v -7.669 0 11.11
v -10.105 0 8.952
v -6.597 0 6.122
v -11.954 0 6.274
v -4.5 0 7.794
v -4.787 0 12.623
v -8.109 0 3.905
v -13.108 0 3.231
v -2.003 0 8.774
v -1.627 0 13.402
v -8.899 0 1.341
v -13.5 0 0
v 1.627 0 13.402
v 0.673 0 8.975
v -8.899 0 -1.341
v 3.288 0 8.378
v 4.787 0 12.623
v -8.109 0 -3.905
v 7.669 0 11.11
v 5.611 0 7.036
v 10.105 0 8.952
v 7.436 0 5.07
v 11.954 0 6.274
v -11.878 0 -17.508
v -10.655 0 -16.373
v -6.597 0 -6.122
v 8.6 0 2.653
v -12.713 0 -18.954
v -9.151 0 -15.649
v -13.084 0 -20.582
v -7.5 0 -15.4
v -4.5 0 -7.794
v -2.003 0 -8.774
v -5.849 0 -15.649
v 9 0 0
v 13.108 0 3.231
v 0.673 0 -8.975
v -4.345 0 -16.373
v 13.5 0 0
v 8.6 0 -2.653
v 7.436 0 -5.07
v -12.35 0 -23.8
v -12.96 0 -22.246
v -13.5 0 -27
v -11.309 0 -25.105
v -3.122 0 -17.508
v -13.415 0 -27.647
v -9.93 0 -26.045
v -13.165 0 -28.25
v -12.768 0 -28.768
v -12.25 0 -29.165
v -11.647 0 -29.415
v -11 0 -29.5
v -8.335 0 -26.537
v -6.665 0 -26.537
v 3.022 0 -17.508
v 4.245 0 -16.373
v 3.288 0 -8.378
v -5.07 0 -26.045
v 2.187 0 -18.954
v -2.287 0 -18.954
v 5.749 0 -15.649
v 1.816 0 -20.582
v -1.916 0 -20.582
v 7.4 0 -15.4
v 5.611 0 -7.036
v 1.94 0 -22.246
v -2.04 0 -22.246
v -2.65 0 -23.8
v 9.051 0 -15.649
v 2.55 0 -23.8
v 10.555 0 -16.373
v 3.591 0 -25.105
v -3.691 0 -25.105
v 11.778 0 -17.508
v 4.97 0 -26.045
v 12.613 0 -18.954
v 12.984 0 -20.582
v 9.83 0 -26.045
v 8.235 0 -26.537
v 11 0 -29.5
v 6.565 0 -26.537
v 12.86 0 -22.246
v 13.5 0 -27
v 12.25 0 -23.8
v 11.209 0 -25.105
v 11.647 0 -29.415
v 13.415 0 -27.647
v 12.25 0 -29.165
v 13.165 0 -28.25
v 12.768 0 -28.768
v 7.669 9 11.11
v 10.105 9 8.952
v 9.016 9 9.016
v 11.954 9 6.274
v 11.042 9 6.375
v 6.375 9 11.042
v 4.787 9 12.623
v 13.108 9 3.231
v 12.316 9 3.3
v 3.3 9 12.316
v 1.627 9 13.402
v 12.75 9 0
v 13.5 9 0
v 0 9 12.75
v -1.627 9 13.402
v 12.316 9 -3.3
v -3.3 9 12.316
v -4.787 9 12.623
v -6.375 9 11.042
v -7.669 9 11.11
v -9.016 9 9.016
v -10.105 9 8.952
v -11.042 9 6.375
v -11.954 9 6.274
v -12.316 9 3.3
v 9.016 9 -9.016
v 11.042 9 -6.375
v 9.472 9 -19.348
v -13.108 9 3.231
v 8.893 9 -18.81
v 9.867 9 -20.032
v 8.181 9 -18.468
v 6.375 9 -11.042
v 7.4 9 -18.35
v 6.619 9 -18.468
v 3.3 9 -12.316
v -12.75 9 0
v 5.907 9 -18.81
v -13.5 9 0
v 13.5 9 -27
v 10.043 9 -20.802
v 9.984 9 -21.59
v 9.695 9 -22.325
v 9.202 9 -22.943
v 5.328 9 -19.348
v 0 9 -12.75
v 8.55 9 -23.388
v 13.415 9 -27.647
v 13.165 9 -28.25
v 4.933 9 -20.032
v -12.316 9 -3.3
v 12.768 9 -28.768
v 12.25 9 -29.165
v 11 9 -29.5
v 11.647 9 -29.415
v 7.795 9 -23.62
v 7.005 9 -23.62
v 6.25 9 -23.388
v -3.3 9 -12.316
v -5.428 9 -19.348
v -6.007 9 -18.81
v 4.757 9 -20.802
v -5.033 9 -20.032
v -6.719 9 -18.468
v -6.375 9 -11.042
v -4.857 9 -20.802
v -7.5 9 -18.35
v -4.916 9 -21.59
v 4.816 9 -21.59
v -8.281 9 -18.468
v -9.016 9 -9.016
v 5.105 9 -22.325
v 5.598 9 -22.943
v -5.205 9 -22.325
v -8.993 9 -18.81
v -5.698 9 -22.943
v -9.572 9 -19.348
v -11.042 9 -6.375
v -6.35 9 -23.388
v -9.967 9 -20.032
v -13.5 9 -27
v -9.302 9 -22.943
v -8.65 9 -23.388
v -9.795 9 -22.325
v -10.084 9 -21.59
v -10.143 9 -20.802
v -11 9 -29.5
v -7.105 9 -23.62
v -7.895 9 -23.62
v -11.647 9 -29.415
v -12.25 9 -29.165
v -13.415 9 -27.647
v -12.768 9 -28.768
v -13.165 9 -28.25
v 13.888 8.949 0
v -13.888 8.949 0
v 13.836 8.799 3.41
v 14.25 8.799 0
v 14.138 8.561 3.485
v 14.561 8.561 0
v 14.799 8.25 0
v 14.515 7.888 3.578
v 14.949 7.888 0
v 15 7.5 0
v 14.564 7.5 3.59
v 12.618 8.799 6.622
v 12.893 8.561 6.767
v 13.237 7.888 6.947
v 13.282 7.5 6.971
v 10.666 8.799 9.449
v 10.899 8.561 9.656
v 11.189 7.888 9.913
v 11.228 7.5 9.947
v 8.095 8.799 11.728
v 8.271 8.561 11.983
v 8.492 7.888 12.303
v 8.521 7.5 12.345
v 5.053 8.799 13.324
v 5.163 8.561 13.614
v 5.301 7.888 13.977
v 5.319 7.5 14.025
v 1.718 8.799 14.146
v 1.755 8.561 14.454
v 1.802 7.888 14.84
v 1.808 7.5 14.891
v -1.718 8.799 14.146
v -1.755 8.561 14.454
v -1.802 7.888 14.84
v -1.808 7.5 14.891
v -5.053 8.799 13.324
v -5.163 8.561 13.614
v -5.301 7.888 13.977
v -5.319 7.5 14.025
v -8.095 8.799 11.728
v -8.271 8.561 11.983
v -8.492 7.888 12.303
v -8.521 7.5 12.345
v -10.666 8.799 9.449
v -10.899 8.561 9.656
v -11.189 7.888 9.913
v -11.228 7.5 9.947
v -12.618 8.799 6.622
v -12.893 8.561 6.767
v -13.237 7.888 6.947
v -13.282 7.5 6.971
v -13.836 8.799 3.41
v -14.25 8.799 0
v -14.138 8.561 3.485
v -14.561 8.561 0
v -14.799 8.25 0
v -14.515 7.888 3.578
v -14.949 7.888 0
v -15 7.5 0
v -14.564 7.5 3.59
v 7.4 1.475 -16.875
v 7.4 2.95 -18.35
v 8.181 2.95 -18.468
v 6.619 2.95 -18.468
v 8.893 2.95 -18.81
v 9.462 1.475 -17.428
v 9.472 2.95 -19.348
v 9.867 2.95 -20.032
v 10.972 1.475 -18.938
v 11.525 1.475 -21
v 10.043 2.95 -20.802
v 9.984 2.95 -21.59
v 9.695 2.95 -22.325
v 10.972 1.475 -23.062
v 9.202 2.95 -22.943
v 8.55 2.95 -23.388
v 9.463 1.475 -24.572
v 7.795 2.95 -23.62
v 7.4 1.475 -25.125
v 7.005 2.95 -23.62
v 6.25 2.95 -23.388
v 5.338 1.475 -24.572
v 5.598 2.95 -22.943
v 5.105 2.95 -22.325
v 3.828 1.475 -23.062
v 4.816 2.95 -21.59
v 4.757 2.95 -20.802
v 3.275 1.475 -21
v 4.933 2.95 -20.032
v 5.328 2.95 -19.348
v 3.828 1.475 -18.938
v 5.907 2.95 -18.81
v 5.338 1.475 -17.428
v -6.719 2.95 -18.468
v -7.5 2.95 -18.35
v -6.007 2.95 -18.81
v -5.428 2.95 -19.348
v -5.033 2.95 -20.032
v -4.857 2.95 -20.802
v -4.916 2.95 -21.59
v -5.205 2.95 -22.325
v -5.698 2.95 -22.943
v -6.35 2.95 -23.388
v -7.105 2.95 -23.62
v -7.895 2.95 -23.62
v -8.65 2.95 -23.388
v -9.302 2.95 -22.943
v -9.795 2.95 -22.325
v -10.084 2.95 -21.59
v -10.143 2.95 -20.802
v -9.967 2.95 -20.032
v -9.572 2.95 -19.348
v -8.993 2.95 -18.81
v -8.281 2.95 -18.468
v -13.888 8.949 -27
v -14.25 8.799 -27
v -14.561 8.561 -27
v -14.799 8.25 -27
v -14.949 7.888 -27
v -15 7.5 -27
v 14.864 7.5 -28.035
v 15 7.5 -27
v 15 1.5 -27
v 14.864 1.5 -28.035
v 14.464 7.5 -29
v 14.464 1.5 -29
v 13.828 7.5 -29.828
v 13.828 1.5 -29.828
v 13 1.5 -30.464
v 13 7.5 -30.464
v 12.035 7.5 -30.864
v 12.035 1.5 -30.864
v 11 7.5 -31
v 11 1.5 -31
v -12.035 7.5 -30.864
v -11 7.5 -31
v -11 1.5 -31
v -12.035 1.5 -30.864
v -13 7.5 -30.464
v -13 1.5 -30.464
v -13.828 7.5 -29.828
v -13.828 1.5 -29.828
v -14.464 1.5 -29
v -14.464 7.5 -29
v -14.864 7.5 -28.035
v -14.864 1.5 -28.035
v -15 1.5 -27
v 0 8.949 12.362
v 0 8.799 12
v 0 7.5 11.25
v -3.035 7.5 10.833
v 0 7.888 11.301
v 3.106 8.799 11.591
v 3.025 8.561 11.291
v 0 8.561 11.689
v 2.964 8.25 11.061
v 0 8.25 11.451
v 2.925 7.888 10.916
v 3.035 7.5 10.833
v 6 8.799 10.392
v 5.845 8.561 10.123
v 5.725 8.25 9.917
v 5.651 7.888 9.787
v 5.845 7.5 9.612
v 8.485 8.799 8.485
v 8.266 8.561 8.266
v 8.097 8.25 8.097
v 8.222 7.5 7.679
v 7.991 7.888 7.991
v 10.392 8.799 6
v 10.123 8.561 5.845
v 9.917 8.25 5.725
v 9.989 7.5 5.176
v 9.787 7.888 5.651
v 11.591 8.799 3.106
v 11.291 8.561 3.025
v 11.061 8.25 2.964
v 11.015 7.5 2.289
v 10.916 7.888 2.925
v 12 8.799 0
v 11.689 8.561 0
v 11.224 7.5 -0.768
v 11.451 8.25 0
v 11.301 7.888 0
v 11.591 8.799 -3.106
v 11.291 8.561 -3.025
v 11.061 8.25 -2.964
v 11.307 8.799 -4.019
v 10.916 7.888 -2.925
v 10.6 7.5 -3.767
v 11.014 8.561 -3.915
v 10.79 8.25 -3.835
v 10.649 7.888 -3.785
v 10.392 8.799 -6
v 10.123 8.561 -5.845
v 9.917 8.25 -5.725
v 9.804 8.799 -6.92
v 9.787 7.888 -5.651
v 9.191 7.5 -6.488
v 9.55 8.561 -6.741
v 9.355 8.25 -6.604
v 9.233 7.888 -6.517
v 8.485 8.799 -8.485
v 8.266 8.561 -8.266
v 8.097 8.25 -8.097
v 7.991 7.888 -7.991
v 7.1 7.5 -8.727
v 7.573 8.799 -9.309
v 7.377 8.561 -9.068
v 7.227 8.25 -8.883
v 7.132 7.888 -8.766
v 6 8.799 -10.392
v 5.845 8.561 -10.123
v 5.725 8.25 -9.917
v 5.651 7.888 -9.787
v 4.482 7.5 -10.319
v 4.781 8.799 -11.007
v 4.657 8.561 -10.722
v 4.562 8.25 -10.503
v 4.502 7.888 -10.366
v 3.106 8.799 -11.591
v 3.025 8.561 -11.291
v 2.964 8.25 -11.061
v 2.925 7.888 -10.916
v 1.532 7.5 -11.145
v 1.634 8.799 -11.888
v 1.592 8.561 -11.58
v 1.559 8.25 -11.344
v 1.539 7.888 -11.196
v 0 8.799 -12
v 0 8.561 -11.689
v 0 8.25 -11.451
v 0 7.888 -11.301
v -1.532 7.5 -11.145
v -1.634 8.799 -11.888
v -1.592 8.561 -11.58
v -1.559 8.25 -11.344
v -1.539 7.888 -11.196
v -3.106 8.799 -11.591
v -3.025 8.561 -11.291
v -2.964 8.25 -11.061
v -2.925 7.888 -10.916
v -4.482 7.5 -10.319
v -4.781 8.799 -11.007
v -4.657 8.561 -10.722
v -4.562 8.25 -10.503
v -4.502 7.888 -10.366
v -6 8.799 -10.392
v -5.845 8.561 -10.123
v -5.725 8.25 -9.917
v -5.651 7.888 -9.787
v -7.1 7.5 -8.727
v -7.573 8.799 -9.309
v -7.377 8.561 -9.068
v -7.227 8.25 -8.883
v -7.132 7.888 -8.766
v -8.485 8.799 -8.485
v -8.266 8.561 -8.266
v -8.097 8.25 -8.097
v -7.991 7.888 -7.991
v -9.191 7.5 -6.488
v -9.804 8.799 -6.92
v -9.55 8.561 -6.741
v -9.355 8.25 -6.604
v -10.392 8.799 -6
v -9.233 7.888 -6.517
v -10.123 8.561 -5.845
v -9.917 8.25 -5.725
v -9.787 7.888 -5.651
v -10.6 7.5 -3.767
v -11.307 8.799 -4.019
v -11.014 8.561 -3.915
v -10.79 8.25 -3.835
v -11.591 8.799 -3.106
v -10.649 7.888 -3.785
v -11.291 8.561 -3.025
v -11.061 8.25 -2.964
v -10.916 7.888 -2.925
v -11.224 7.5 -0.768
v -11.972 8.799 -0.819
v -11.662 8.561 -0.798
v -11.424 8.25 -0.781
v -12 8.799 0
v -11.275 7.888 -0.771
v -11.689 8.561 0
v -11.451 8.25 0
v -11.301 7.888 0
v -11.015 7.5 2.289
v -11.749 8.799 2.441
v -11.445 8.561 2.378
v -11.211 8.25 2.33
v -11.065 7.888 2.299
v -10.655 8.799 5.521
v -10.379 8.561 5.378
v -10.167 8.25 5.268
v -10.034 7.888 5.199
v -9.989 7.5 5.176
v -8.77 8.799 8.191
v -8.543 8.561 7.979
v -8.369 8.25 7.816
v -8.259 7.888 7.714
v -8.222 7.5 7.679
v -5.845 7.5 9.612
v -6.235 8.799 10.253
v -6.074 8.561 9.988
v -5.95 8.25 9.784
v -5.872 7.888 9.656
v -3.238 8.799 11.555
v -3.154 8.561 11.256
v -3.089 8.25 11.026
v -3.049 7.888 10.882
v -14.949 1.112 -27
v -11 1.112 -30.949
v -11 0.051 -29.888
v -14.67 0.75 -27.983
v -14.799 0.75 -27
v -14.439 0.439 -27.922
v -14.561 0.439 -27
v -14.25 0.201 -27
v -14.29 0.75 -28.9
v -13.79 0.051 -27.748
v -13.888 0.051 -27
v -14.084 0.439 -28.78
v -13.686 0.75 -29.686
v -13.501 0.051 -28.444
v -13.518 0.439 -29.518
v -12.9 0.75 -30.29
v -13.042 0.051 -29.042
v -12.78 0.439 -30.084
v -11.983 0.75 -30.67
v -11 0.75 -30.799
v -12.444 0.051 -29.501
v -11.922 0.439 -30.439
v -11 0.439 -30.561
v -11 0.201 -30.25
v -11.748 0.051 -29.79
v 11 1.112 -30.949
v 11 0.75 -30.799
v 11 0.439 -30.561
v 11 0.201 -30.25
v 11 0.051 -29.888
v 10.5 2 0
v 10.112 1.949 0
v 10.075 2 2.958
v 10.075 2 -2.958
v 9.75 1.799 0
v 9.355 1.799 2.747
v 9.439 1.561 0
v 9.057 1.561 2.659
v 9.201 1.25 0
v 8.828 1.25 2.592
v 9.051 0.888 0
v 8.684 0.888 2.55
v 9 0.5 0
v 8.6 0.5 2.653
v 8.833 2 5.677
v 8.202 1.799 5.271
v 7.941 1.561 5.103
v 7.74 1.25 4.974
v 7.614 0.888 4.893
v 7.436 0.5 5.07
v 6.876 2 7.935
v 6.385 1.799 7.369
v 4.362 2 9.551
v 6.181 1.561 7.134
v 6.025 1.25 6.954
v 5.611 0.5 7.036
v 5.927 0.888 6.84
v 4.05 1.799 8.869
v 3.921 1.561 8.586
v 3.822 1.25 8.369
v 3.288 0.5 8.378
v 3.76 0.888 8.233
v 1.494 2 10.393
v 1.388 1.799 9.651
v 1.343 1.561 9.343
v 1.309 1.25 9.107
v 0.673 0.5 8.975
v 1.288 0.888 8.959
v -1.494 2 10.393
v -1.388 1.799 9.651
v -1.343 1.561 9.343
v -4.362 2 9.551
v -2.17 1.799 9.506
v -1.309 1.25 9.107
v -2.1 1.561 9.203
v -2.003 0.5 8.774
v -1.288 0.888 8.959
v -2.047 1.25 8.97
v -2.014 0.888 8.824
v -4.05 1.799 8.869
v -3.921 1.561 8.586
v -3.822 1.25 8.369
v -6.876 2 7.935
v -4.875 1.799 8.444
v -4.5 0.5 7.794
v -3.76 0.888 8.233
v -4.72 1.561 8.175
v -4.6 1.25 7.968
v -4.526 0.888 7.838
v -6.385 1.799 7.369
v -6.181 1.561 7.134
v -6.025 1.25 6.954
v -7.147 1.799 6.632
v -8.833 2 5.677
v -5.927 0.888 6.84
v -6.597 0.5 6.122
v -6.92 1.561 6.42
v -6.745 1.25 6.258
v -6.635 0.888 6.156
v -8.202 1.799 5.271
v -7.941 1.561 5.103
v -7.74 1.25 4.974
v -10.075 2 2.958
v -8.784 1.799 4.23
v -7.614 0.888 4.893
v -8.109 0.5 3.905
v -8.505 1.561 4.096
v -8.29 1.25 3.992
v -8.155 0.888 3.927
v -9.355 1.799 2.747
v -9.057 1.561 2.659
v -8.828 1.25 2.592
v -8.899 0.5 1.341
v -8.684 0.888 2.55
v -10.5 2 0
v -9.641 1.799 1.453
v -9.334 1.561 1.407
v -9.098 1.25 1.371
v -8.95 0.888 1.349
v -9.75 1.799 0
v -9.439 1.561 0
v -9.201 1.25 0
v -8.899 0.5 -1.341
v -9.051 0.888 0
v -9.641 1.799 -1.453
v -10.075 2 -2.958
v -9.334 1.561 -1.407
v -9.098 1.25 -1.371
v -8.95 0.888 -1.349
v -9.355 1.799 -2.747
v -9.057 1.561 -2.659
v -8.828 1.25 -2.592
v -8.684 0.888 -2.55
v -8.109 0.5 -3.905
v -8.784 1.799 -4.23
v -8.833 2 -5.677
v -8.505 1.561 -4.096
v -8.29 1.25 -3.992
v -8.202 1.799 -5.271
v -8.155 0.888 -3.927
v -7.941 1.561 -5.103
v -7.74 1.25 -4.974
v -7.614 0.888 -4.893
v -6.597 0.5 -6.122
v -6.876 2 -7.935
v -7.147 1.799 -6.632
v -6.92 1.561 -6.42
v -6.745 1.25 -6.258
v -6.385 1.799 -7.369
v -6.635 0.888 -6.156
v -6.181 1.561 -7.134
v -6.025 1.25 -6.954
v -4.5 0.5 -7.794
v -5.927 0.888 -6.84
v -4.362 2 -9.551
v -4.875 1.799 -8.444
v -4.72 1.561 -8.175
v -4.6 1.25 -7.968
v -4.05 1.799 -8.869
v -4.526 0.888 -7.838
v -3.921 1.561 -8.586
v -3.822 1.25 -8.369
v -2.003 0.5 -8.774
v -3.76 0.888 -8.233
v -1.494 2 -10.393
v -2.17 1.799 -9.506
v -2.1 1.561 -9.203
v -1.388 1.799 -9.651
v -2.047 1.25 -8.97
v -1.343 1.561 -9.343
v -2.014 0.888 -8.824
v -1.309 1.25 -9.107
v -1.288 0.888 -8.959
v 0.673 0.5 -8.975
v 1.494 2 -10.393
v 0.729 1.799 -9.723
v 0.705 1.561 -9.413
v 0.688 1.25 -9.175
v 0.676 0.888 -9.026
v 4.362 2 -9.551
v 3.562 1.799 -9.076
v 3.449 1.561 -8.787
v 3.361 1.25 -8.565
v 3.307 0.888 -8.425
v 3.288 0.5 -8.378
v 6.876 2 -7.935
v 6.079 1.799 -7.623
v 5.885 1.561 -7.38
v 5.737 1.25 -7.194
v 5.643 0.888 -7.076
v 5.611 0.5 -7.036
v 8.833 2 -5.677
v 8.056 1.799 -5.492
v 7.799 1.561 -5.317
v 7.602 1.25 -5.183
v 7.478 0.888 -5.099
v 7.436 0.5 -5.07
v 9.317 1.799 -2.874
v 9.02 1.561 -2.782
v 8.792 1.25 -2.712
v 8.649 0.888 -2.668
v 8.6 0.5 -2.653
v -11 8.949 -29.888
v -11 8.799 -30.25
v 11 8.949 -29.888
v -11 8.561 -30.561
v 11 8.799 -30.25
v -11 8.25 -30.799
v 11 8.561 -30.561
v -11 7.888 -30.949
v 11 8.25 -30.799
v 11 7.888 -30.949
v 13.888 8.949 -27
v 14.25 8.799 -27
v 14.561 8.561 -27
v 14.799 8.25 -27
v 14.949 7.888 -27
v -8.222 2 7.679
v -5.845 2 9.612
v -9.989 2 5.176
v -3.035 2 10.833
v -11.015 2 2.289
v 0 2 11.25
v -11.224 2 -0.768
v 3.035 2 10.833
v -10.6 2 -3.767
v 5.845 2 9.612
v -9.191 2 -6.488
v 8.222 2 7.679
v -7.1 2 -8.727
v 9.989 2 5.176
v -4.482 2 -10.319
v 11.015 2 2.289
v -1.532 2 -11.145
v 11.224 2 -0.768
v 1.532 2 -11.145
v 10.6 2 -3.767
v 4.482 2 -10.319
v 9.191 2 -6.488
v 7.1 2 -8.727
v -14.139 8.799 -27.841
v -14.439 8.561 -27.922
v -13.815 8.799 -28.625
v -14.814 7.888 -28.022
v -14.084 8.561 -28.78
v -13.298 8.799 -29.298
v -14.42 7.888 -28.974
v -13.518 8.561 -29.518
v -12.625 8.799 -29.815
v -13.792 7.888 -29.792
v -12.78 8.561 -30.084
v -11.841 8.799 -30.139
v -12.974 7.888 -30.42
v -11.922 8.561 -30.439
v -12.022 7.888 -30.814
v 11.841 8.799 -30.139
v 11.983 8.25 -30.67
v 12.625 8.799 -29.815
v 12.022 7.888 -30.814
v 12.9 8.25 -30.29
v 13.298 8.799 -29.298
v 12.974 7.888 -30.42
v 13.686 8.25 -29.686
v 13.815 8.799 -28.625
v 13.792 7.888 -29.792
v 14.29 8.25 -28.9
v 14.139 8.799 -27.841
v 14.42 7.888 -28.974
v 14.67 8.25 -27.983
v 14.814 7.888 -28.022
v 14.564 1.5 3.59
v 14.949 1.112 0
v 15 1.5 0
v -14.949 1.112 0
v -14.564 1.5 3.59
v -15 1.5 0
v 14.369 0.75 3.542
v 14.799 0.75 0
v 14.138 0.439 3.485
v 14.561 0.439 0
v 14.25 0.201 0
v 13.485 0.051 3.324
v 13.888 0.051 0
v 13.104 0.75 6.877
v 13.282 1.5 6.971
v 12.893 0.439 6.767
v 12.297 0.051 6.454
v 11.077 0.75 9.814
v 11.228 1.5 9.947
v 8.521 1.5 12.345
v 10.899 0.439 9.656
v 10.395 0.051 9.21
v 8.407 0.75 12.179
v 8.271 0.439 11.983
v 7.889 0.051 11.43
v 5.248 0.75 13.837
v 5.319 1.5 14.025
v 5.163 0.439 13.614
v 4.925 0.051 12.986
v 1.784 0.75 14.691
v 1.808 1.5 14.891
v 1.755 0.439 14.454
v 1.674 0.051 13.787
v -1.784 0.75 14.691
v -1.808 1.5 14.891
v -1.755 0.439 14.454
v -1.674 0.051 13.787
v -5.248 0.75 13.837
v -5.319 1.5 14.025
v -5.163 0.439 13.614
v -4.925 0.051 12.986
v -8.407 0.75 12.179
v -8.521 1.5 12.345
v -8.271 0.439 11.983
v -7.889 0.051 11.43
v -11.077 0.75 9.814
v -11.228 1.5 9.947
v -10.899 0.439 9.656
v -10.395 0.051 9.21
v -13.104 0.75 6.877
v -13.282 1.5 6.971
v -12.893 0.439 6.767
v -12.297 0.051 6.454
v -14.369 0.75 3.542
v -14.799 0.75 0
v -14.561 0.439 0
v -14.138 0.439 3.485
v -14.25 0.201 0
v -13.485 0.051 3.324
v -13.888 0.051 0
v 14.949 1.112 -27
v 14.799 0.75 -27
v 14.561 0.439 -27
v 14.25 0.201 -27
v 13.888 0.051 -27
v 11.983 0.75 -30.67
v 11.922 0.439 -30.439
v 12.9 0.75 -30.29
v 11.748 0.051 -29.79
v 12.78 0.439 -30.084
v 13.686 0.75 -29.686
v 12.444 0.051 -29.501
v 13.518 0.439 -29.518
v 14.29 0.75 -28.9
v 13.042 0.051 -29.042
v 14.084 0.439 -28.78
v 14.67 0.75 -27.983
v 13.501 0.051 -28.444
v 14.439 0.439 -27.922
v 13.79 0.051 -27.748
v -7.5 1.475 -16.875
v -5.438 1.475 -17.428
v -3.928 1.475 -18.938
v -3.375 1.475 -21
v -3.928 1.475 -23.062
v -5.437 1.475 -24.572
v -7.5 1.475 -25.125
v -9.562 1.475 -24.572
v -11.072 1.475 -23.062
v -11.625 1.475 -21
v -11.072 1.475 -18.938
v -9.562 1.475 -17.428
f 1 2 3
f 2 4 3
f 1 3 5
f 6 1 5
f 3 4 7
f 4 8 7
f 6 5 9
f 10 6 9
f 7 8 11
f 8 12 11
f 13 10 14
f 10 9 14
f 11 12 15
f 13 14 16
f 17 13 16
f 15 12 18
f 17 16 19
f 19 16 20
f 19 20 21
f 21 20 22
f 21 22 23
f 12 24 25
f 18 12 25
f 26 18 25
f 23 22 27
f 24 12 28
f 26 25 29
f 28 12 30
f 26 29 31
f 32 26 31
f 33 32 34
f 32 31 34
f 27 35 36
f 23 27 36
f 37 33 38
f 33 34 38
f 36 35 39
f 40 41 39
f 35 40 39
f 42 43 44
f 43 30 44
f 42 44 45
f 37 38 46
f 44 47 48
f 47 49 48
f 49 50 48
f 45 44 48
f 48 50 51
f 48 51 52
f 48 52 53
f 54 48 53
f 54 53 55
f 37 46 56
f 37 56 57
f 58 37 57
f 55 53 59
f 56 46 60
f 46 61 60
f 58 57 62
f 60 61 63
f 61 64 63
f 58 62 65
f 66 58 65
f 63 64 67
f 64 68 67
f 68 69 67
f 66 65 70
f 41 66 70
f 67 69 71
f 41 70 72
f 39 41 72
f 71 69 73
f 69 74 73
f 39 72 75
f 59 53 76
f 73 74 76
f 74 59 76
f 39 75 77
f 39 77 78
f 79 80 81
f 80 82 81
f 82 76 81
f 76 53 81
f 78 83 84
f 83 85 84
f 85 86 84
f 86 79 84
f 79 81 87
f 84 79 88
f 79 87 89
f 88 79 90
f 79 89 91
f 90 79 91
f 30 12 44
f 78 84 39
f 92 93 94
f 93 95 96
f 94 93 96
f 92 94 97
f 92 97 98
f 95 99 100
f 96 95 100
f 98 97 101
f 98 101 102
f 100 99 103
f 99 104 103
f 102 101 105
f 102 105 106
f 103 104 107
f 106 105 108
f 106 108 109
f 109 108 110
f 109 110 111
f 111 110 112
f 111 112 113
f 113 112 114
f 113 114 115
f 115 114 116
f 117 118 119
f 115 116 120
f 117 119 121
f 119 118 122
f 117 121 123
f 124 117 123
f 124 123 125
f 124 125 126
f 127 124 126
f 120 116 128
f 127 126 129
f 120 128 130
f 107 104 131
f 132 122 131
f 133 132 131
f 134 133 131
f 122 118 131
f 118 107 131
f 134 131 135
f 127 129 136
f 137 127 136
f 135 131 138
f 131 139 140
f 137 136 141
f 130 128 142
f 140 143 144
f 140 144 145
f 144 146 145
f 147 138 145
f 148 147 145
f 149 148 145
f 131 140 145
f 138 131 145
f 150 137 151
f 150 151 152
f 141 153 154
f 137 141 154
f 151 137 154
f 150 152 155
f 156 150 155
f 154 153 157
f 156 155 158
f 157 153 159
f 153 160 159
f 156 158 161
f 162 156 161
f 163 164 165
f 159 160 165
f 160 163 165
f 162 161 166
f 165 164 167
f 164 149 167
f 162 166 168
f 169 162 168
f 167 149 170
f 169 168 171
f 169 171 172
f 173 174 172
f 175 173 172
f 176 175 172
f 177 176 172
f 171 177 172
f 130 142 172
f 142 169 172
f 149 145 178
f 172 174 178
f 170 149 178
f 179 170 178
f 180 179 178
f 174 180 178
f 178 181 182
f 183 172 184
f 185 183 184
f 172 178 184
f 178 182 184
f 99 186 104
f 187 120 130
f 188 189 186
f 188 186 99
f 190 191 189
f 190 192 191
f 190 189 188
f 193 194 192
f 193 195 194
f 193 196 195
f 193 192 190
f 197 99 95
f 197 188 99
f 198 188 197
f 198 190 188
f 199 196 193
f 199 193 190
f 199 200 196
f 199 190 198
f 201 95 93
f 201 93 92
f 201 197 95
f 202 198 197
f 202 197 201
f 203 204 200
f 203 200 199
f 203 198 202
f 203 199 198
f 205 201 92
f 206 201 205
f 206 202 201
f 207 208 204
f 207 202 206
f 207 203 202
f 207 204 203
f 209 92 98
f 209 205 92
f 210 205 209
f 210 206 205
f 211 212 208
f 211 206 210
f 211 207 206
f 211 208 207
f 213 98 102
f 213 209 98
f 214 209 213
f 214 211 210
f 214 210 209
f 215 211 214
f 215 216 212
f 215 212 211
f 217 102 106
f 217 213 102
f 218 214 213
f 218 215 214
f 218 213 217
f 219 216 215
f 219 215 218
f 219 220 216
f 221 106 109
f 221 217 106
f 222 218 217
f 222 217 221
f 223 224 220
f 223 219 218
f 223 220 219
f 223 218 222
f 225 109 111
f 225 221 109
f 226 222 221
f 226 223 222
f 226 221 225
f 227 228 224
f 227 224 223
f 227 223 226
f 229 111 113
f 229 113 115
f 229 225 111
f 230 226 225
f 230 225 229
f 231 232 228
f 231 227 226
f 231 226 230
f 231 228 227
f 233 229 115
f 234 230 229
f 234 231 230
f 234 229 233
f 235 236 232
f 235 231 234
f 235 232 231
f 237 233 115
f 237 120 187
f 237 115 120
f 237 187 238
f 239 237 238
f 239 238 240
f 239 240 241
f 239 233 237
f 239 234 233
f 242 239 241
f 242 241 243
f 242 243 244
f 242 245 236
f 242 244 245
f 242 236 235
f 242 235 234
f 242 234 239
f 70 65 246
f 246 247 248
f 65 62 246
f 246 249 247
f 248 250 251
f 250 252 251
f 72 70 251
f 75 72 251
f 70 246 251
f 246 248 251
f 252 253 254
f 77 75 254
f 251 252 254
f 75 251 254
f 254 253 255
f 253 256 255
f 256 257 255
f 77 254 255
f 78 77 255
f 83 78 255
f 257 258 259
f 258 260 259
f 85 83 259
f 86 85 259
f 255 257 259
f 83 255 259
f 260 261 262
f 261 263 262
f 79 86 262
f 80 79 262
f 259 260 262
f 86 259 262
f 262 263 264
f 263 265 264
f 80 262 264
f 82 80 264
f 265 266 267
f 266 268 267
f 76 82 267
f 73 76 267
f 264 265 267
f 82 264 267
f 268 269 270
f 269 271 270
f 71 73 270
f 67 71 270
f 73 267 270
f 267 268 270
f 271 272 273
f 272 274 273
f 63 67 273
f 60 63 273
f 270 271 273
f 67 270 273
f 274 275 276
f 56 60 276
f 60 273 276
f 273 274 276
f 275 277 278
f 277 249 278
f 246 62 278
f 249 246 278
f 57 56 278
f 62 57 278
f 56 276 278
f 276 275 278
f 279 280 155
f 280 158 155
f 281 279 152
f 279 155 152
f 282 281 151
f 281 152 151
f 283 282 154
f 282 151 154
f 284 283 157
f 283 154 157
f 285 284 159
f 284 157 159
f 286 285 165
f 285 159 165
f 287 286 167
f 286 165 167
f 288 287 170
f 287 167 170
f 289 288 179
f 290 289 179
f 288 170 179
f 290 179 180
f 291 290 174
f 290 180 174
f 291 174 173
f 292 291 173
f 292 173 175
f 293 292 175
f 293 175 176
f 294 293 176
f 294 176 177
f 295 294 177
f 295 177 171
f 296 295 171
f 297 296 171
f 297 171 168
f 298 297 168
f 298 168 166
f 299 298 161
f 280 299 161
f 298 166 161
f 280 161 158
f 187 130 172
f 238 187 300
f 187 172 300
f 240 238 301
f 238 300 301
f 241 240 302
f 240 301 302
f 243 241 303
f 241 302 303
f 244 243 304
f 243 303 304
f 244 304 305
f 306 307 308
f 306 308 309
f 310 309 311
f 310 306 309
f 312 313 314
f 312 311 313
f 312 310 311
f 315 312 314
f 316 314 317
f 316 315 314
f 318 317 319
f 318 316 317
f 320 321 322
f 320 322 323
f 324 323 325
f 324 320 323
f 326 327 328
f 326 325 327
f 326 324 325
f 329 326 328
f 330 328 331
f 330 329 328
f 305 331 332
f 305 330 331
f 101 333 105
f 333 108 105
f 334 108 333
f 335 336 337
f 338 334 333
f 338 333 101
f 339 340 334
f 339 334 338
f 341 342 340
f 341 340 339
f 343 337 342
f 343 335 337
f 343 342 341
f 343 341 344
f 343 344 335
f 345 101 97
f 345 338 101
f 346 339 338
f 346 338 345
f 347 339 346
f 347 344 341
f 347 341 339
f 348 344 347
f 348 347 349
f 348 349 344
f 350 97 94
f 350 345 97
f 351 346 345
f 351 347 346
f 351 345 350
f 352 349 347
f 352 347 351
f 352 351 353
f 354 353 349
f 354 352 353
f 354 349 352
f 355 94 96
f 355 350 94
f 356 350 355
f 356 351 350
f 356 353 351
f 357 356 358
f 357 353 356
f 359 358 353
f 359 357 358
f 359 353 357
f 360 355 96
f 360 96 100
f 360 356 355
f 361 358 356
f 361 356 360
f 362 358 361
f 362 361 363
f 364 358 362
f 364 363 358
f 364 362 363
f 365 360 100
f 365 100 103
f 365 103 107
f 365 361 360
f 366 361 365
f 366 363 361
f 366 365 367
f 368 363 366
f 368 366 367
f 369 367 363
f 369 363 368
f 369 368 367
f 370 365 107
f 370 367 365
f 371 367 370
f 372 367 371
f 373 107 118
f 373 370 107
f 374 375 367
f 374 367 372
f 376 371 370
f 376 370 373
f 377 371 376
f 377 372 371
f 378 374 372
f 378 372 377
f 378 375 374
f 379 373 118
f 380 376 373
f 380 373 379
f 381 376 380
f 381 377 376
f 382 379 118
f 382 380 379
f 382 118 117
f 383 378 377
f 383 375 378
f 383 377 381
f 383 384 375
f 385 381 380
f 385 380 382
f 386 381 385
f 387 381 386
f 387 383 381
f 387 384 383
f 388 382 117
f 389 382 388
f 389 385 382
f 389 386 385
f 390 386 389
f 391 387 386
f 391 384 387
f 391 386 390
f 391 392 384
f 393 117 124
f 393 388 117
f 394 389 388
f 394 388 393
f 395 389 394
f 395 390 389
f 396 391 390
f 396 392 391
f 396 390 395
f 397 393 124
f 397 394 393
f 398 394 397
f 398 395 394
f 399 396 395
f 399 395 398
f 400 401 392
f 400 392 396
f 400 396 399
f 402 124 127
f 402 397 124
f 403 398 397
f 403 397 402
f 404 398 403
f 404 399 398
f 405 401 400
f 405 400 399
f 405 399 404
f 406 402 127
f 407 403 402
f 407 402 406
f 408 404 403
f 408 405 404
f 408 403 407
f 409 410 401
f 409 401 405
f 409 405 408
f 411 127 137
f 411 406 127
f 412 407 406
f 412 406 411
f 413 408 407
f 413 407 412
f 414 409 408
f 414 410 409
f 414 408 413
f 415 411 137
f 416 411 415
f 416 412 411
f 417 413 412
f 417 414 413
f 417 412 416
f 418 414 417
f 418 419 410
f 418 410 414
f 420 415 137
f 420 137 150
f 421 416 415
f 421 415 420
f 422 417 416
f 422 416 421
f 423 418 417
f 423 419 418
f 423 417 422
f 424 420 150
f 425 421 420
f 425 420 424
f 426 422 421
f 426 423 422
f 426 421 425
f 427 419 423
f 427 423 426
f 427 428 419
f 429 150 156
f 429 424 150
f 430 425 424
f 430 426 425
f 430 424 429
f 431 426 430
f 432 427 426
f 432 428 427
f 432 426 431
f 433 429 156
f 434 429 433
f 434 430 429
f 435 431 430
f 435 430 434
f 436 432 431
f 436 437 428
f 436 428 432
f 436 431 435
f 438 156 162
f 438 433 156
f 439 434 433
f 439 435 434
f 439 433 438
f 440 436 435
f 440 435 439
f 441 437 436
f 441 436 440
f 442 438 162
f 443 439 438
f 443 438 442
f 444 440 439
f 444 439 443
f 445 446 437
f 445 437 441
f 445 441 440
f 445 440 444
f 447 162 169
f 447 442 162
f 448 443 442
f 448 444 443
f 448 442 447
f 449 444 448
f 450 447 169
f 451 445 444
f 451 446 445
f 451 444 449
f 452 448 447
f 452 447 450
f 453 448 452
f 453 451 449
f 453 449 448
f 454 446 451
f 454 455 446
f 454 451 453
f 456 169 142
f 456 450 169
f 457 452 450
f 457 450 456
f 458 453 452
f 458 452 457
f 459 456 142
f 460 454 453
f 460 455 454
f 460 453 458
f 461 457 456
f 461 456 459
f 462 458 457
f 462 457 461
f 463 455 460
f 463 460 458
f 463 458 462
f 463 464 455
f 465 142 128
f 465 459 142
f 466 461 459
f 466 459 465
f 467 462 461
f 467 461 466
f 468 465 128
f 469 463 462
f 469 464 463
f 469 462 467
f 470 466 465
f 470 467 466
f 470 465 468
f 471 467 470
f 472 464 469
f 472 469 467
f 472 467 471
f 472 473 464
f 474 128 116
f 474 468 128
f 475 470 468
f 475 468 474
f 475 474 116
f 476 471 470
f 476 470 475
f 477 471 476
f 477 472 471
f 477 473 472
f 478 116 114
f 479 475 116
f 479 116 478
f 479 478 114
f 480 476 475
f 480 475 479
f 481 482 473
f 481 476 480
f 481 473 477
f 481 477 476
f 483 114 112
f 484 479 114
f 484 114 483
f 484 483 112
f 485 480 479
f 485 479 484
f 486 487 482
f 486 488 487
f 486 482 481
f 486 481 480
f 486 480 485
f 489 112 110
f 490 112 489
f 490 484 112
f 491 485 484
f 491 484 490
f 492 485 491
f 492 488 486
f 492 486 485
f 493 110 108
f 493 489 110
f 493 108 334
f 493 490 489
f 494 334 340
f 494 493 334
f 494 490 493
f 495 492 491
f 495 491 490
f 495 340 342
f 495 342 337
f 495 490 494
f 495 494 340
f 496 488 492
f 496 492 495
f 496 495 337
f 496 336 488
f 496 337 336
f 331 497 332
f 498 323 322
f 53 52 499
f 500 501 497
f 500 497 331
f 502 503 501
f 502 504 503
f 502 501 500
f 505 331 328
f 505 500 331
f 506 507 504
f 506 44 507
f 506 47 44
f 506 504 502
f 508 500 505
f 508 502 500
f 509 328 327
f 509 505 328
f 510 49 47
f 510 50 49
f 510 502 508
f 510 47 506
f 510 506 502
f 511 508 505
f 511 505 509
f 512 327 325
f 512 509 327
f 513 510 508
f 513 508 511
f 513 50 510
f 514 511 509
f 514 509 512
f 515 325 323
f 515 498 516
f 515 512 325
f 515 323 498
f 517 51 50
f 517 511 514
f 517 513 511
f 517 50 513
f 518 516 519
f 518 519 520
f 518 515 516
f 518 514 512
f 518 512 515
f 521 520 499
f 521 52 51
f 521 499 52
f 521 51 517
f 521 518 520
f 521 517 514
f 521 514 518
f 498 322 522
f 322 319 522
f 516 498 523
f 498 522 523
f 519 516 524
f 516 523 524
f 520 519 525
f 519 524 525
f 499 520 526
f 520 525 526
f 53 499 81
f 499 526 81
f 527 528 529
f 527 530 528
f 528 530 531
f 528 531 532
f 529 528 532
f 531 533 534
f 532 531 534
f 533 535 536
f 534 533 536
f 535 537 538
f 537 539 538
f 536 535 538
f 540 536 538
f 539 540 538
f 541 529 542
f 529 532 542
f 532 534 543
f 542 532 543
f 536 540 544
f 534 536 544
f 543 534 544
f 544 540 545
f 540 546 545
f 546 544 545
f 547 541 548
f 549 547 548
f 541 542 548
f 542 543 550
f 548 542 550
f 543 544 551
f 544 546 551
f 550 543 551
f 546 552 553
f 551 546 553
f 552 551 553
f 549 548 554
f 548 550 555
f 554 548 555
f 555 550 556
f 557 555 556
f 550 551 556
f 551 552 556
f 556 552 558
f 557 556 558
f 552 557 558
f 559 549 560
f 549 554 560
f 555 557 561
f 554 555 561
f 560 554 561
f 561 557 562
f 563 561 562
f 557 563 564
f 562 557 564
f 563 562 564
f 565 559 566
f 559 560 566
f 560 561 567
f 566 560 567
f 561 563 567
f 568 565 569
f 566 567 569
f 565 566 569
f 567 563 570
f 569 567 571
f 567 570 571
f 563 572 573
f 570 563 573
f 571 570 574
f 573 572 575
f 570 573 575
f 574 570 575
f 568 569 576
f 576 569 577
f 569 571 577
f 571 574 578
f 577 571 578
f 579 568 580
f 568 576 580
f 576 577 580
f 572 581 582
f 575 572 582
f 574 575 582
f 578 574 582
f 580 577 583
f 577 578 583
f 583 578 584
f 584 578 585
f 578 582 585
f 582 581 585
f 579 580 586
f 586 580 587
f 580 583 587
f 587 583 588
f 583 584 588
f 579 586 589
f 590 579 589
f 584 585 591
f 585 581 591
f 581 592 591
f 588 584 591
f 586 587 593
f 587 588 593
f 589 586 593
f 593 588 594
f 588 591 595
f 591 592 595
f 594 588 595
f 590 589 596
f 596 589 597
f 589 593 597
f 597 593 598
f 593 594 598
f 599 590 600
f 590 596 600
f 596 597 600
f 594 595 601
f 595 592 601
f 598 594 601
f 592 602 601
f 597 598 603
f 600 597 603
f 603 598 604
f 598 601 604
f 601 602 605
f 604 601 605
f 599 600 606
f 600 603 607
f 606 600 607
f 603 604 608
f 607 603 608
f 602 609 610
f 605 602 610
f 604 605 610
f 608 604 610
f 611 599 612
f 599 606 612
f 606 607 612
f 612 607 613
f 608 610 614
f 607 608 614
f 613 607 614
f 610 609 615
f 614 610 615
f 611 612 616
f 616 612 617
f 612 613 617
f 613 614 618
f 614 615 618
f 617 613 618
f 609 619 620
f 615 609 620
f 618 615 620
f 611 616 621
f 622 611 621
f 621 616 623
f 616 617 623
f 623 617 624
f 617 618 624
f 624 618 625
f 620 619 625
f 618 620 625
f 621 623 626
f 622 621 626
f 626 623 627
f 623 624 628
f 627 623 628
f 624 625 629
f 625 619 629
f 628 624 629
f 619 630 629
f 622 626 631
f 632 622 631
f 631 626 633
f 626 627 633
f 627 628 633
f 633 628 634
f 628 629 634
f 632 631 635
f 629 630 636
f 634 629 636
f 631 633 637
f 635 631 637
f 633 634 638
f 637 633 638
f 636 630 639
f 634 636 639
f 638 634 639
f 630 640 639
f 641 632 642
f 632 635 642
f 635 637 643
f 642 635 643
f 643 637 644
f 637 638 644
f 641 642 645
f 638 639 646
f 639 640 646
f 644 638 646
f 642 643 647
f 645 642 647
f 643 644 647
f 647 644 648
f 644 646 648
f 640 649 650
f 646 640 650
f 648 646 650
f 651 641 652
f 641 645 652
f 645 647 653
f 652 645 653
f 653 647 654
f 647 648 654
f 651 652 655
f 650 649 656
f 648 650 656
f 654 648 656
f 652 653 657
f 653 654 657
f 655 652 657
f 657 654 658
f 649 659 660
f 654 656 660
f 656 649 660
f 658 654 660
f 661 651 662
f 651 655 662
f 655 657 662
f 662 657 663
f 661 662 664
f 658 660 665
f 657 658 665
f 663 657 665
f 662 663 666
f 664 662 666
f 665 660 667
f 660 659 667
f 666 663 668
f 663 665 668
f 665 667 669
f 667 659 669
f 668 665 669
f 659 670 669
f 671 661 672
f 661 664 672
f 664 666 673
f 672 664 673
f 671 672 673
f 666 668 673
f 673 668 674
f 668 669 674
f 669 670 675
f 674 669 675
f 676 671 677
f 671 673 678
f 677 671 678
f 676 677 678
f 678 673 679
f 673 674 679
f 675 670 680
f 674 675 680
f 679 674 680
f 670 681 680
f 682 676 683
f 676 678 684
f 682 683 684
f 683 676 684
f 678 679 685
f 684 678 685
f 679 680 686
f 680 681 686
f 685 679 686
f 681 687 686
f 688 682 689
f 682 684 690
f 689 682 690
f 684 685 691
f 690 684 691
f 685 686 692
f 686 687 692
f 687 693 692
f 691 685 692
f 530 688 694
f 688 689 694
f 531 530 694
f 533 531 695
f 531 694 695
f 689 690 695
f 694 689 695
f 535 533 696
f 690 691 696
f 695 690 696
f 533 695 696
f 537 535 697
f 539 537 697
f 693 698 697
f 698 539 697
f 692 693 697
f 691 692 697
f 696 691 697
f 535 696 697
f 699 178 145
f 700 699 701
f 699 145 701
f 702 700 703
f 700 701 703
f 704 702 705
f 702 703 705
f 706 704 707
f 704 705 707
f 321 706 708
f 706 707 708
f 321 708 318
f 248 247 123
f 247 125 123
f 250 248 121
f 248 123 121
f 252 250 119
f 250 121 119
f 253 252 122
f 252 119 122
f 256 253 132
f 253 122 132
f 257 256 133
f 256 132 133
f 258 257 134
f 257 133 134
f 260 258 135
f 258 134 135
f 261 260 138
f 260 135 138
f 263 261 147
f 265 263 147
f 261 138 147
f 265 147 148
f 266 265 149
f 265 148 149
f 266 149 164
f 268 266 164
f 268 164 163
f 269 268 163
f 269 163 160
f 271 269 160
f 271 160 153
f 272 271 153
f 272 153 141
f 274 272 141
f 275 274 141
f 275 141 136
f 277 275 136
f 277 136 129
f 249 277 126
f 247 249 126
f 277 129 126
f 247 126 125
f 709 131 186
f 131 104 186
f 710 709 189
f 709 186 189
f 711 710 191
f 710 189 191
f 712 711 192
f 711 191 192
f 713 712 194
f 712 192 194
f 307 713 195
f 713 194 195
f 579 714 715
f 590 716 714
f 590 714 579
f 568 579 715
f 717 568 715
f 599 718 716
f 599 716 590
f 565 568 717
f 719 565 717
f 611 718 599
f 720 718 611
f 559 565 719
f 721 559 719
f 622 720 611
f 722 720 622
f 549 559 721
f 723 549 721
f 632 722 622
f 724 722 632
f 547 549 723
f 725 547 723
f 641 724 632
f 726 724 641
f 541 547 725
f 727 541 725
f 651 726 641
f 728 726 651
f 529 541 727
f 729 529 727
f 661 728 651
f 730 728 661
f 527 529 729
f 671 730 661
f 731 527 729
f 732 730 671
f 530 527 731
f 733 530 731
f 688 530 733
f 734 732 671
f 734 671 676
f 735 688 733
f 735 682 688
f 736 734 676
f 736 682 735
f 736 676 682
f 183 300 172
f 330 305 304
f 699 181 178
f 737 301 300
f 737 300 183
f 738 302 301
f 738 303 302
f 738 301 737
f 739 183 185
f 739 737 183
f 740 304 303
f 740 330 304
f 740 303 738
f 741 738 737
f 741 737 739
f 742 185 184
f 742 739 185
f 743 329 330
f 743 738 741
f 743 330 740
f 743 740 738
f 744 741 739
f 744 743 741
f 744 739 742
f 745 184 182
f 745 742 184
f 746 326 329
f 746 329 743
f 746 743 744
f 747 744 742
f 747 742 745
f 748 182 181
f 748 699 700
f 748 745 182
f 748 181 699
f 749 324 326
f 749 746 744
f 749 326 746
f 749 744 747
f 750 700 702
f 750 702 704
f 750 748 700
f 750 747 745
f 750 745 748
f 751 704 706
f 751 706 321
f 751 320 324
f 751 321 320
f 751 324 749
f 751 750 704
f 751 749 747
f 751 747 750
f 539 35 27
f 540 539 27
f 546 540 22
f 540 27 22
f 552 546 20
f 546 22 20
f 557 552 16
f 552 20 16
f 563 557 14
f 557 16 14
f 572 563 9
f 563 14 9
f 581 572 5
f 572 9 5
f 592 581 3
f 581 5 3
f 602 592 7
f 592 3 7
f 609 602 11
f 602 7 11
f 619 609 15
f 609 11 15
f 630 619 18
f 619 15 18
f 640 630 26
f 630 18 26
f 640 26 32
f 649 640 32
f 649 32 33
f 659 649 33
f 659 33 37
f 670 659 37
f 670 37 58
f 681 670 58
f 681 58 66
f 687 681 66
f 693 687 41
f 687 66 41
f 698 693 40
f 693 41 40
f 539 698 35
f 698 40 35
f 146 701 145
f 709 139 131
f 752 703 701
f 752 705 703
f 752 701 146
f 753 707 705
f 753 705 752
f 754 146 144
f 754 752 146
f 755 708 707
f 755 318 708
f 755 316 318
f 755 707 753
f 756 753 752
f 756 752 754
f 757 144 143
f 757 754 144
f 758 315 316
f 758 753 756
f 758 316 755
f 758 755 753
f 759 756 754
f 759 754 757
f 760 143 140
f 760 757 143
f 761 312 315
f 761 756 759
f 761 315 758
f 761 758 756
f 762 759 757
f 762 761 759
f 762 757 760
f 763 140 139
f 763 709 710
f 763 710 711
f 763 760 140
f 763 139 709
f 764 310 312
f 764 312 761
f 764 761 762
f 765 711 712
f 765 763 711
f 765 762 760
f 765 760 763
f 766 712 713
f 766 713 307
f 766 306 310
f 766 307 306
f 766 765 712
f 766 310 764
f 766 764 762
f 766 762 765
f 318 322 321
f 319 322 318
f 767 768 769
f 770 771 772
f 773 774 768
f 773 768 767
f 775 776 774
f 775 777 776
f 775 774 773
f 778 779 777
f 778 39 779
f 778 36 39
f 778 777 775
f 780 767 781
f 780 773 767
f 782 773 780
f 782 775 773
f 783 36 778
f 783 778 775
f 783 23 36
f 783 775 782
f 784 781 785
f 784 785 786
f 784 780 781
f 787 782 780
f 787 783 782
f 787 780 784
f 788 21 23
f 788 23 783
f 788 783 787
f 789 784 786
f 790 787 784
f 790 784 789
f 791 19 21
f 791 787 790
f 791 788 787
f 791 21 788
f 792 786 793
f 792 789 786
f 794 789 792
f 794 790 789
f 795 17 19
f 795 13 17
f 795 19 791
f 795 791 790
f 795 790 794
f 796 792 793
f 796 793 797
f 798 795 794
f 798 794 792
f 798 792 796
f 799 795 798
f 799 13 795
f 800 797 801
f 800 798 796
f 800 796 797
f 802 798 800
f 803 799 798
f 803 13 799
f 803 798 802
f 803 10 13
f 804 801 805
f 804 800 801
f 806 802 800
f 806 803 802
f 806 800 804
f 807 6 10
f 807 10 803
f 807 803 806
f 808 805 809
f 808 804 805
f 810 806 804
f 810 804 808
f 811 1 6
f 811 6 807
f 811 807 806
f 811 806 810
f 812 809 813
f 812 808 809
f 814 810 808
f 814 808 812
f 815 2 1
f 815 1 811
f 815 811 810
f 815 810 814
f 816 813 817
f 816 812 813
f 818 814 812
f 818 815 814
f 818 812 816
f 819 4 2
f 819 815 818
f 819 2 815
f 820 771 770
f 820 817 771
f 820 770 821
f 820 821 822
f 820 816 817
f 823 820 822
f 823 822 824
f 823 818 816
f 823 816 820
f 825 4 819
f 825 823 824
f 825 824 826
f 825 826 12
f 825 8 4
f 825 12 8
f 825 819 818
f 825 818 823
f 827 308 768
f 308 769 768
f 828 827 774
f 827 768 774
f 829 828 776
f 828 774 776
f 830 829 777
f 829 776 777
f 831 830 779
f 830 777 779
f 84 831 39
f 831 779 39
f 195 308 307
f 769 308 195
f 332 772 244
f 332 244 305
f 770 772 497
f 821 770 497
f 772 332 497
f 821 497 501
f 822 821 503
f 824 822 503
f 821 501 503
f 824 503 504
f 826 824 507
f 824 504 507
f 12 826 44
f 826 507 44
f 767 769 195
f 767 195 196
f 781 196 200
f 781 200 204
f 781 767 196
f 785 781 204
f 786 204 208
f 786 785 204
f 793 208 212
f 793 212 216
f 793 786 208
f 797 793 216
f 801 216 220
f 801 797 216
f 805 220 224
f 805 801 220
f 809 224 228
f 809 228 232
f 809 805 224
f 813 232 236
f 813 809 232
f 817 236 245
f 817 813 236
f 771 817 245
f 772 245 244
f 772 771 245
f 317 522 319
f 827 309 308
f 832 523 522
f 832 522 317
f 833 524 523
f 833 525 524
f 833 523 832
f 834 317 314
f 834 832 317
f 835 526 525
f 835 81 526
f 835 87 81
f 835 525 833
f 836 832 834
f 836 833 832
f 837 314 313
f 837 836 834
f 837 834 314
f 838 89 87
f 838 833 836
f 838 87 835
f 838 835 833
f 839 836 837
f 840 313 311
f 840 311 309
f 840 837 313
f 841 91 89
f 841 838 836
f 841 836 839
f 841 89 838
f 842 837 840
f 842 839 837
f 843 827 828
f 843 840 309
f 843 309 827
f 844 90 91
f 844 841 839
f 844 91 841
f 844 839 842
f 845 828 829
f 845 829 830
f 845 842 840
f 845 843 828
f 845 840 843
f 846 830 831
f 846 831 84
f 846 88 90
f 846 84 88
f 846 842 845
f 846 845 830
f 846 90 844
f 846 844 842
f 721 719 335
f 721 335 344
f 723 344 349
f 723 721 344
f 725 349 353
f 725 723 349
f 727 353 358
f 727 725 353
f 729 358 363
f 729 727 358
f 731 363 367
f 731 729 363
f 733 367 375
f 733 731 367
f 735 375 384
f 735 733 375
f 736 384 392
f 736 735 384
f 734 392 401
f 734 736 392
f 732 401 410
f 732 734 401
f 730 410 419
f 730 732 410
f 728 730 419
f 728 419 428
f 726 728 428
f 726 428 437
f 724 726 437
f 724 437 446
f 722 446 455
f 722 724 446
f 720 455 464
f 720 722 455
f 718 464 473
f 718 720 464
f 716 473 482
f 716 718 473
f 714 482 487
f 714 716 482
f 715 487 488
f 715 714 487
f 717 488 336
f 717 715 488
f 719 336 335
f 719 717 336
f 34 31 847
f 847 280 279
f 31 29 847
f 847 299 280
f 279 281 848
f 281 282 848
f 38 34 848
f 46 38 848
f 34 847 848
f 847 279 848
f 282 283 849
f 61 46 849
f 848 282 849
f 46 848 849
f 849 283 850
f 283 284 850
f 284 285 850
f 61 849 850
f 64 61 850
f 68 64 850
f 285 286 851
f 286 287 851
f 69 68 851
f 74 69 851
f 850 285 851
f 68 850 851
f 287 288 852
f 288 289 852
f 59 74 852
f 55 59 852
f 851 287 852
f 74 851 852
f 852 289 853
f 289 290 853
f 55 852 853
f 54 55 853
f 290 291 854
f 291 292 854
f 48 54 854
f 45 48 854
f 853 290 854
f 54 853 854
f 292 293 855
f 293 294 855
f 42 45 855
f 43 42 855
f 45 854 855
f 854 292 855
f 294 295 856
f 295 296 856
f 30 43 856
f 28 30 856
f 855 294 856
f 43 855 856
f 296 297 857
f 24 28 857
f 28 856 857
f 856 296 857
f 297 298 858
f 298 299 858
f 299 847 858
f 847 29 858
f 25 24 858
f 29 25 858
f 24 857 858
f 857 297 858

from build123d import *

# Parameters (mm, degrees)
SKETCH2_R                     = 11.25
BOSS_EXTRUDE1_DEPTH           = 9
SKETCH2_3_R                   = 11.25
SKETCH2_3_R_2                 = 9
BOSS_EXTRUDE2_DEPTH           = 2
CSK_FOR_M5_SFHCS1_D           = 5.3
CSK_FOR_M5_SFHCS1_CSINK_D     = 11.2
CSK_FOR_M5_SFHCS1_CSINK_ANGLE = 90
FILLET1_R                     = 4
FILLET2_R                     = 1.5


with BuildPart() as part:
    # Sketch2 → Boss-Extrude1 (new body)
    with BuildSketch(Plane(origin=(0, 0, 0), x_dir=(1, 0, 0), z_dir=(0, 1, 0))):
        with BuildLine():
            Line((-15, 31), (-15, 0))
            ThreePointArc((-15, 0), (0, -15), (15, 0))
            Line((15, 0), (15, 31))
            Line((15, 31), (-15, 31))
        make_face()
        Circle(SKETCH2_R, mode=Mode.SUBTRACT)
    extrude(amount=BOSS_EXTRUDE1_DEPTH)

    # Sketch2<3> → Boss-Extrude2 (add)
    with BuildSketch(Plane(origin=(0, 0, 0), x_dir=(1, 0, 0), z_dir=(0, 1, 0))):
        Circle(SKETCH2_3_R)
        Circle(SKETCH2_3_R_2, mode=Mode.SUBTRACT)
    extrude(amount=BOSS_EXTRUDE2_DEPTH)

    # CSK for M5 SFHCS1 (through all)
    with Locations(Plane(origin=(7.4, 0, -21), x_dir=(0, 0, -1), z_dir=(0, -1, 0))):
        with Locations((0, 0), (0, -14.9)):
            CounterSinkHole(CSK_FOR_M5_SFHCS1_D / 2, CSK_FOR_M5_SFHCS1_CSINK_D / 2, counter_sink_angle=CSK_FOR_M5_SFHCS1_CSINK_ANGLE)

    # Fillet1
    fillet1_edges = [part.edges().sort_by_distance(p)[0] for p in [
        (-15, 4.5, -31),
        (15, 4.5, -31),
    ]]
    fillet(fillet1_edges, radius=FILLET1_R)

    # Fillet2
    fillet2_edges = [part.edges().sort_by_distance(p)[0] for p in [
        (0, 0, 15),
        (-15, 0, -13.5),
        (-13.828427125, 0, -29.828427125),
        (0, 0, -31),
        (13.828427125, 0, -29.828427125),
        (0, 9, 15),
        (-15, 9, -13.5),
        (-13.828427125, 9, -29.828427125),
        (0, 9, -31),
        (13.828427125, 9, -29.828427125),
        (-9, 2, 0),
        (-11.25, 9, 0),
        (15, 0, -13.5),
        (15, 9, -13.5),
    ]]
    fillet(fillet2_edges, radius=FILLET2_R)


solid = part.part
